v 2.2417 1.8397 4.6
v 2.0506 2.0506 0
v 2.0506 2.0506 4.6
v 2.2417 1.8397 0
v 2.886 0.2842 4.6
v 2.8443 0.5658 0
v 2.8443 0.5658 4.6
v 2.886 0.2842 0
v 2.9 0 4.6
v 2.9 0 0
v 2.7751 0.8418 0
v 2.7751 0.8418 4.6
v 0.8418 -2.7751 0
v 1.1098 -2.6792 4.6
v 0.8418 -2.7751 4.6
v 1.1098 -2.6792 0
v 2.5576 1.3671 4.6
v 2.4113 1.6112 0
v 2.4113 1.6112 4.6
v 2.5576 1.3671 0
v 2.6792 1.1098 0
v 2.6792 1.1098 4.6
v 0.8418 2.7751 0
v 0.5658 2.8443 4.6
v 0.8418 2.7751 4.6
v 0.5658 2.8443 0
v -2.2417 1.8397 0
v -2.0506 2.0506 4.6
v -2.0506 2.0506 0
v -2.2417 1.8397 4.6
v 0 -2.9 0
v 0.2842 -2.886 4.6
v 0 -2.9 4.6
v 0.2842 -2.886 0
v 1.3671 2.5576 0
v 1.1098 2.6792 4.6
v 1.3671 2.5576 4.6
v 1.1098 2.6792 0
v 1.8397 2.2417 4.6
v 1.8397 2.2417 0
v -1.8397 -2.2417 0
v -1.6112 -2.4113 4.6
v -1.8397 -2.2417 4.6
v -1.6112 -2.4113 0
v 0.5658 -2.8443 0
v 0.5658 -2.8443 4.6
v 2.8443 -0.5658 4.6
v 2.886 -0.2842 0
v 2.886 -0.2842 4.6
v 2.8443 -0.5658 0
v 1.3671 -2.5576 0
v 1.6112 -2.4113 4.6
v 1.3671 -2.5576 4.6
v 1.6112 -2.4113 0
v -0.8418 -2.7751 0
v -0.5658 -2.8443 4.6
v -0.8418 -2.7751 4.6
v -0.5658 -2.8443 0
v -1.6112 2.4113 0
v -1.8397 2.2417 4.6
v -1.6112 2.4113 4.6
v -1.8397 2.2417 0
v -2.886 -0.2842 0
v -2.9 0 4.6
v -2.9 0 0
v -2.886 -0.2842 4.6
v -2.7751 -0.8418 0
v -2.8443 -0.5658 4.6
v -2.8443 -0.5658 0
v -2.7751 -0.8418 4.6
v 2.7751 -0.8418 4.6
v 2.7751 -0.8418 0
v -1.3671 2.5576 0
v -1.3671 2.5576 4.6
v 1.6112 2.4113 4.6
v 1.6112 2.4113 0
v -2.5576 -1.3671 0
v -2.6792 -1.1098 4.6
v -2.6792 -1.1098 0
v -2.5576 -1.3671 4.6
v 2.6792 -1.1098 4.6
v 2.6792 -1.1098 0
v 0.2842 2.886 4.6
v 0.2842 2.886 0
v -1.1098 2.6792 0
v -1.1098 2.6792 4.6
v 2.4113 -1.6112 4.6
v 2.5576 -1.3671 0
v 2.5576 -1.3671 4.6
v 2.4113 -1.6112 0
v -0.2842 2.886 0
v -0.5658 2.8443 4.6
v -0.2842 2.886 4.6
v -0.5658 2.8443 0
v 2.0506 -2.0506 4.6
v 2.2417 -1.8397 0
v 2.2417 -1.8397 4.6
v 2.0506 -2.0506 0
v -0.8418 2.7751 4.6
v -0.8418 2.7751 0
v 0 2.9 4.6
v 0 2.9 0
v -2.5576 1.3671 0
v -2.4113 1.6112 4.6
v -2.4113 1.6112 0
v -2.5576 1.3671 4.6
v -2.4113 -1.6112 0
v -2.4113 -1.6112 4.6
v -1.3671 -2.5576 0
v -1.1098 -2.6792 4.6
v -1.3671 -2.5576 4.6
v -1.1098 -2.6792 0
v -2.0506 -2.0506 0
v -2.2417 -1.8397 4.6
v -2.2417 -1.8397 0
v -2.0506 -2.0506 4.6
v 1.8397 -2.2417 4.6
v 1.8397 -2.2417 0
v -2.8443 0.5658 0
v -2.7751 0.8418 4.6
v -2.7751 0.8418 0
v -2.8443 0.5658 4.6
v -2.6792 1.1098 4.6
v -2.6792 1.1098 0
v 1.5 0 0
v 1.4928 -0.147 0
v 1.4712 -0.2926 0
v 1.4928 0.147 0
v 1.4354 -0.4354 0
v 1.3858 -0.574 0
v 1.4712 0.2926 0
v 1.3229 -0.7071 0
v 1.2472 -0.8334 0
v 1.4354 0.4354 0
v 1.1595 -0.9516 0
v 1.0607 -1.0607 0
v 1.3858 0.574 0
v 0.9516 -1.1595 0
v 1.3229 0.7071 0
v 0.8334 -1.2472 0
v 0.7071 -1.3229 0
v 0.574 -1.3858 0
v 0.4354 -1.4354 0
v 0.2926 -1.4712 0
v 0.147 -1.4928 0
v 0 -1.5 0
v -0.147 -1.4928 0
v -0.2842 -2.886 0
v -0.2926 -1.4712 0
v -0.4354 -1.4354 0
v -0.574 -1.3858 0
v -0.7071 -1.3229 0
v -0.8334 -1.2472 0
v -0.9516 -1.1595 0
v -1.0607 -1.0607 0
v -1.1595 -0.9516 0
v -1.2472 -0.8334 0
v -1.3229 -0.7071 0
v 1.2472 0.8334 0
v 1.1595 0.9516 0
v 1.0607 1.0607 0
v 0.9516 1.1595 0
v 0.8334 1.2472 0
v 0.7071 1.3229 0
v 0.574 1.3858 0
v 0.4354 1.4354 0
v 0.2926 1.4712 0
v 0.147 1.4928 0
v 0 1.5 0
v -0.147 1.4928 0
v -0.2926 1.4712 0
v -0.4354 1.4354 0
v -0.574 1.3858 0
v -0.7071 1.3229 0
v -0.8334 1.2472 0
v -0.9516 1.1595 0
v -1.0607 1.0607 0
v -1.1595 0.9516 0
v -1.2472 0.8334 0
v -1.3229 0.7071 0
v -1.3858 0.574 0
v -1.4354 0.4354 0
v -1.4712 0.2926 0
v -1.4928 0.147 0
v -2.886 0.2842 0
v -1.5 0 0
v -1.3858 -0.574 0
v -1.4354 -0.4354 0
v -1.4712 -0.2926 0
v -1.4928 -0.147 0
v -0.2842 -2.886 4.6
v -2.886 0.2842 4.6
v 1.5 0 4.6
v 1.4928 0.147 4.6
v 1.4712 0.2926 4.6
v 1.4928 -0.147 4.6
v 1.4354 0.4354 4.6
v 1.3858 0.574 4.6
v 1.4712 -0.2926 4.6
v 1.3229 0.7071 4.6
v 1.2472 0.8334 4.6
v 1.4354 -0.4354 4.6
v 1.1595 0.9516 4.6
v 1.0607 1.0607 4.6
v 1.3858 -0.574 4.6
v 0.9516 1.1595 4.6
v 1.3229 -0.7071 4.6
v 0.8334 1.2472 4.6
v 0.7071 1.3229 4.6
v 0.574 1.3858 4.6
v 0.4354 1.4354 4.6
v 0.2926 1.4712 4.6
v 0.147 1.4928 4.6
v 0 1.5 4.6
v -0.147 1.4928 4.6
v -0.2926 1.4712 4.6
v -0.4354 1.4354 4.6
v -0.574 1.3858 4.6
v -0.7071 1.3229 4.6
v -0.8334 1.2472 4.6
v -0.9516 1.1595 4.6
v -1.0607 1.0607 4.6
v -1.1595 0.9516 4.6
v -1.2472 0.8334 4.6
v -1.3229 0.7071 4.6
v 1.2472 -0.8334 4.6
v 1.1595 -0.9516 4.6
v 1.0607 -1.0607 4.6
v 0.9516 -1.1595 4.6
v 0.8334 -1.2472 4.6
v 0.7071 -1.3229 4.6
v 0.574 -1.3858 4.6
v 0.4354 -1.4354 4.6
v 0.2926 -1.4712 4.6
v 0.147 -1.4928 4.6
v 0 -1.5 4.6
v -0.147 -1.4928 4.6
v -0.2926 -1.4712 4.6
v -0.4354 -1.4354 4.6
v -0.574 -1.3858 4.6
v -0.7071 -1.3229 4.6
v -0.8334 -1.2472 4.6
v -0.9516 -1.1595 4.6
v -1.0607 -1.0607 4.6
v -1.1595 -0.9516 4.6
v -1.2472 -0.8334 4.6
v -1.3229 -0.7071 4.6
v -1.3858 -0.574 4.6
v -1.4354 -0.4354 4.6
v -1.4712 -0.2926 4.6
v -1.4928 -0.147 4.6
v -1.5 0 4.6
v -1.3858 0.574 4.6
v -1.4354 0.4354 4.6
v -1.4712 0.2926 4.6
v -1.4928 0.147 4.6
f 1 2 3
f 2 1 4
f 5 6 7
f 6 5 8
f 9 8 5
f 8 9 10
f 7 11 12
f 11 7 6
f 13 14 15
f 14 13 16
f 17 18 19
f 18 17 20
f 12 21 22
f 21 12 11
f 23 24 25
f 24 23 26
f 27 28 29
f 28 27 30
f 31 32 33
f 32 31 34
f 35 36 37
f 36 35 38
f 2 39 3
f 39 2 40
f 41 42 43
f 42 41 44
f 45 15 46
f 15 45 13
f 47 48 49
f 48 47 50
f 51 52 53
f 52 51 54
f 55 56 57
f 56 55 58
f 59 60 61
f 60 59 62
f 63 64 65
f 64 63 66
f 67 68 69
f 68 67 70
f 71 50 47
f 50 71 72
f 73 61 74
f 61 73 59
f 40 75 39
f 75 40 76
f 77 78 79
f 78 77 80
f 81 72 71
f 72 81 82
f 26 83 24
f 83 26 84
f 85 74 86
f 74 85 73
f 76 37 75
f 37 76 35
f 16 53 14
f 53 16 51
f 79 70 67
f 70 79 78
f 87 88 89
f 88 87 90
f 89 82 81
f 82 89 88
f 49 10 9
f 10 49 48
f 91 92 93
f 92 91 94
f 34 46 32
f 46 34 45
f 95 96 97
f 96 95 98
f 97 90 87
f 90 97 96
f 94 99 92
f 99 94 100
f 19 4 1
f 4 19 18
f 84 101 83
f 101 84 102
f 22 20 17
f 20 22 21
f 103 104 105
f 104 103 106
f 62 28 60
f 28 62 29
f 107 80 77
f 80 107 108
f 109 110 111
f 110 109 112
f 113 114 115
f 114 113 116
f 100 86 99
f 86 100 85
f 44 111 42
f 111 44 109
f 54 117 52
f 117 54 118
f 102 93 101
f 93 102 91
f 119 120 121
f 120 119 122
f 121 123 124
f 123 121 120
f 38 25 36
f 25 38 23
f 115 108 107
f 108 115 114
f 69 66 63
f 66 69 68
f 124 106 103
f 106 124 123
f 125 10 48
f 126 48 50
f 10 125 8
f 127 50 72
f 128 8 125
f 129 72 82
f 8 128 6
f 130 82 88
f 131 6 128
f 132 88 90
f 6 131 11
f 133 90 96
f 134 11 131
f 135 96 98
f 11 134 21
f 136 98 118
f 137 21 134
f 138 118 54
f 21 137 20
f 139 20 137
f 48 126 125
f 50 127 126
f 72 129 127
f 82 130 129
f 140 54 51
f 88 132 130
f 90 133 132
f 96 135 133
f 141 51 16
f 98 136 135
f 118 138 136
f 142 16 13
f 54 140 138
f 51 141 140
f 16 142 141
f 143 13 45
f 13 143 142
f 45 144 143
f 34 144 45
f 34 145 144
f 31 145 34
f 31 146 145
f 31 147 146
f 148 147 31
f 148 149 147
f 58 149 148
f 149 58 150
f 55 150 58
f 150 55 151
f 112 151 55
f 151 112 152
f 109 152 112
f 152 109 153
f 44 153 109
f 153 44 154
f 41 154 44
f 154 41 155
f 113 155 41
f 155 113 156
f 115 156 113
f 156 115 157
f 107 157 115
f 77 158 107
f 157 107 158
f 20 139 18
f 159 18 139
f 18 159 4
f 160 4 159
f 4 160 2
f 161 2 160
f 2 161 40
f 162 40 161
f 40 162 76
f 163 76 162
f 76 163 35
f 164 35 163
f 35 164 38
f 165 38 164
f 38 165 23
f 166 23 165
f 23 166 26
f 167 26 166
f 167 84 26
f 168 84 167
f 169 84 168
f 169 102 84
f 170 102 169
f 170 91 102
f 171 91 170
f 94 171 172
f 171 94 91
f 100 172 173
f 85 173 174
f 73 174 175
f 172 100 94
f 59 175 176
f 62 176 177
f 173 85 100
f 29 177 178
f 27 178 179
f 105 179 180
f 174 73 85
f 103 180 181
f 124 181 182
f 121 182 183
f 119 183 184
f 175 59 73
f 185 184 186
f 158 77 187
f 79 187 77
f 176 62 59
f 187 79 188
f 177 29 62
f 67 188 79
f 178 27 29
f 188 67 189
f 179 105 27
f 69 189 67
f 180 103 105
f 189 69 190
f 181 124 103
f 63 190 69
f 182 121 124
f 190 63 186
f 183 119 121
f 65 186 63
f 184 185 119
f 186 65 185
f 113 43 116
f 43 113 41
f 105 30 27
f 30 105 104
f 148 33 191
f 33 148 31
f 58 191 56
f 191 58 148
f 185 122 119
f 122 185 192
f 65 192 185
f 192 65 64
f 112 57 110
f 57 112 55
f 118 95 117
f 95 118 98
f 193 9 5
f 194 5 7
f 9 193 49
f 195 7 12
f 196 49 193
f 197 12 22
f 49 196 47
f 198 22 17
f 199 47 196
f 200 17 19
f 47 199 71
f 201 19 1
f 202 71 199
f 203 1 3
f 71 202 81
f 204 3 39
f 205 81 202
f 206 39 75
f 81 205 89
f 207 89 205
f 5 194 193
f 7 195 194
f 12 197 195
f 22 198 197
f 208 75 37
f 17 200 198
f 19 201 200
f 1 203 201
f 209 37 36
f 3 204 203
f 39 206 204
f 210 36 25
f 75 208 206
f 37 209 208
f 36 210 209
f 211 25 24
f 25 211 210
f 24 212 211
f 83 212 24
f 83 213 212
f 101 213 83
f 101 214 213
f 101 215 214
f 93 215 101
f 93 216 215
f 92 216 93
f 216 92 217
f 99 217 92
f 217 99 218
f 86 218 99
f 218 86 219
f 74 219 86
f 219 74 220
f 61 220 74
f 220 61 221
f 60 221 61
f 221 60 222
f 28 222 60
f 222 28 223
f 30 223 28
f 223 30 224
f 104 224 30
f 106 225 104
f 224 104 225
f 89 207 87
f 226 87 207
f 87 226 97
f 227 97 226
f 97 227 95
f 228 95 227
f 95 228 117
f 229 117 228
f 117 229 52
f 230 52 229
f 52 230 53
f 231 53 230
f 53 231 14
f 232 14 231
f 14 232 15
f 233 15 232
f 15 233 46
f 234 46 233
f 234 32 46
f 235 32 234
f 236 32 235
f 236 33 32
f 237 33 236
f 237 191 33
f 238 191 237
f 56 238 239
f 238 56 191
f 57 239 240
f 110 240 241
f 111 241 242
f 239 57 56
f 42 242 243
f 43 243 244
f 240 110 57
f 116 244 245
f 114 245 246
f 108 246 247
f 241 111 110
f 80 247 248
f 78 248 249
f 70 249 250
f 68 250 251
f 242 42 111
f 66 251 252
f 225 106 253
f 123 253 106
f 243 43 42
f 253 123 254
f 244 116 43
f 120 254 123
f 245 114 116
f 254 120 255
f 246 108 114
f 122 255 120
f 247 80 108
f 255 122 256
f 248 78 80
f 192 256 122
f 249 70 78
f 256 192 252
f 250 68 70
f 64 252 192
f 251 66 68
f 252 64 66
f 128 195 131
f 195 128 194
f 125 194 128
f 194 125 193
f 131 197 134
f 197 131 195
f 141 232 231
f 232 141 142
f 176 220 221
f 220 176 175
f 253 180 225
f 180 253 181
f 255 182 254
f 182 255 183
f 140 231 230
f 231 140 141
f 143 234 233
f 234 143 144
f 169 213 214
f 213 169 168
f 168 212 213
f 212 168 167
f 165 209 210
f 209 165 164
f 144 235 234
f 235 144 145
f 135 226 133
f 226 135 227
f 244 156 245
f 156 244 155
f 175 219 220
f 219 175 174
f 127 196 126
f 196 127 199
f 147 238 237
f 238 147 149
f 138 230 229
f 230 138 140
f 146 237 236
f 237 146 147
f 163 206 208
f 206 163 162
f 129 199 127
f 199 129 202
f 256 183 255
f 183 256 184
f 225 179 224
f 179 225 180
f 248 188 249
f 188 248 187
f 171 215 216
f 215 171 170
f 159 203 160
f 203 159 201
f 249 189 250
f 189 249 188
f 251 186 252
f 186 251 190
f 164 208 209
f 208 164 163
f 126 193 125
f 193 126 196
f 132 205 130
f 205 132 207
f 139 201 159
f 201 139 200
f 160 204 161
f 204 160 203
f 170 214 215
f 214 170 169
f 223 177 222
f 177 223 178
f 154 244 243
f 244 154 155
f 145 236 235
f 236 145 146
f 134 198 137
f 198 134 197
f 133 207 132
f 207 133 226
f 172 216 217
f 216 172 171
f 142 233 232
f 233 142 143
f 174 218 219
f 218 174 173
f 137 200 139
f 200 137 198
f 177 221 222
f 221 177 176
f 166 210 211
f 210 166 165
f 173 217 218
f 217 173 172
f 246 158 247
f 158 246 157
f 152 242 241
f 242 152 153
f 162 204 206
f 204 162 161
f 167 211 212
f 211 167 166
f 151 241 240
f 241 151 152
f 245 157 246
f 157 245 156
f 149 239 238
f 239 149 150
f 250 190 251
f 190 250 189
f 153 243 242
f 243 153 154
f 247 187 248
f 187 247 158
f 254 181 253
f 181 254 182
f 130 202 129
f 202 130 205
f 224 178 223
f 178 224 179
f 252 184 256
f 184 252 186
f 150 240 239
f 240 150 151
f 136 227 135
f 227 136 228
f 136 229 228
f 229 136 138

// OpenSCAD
module threaded_heat_set_insert() {
    difference() {
        // Outer cylinder
        cylinder(d=5.8, h=4.6, $fn=64);
        
        // Inner thread space for 3.0mm screw
        translate([0, 0, -1]) // Extend slightly below for better fit
        cylinder(d=3.0, h=6.6, $fn=64);
    }
}

threaded_heat_set_insert();
